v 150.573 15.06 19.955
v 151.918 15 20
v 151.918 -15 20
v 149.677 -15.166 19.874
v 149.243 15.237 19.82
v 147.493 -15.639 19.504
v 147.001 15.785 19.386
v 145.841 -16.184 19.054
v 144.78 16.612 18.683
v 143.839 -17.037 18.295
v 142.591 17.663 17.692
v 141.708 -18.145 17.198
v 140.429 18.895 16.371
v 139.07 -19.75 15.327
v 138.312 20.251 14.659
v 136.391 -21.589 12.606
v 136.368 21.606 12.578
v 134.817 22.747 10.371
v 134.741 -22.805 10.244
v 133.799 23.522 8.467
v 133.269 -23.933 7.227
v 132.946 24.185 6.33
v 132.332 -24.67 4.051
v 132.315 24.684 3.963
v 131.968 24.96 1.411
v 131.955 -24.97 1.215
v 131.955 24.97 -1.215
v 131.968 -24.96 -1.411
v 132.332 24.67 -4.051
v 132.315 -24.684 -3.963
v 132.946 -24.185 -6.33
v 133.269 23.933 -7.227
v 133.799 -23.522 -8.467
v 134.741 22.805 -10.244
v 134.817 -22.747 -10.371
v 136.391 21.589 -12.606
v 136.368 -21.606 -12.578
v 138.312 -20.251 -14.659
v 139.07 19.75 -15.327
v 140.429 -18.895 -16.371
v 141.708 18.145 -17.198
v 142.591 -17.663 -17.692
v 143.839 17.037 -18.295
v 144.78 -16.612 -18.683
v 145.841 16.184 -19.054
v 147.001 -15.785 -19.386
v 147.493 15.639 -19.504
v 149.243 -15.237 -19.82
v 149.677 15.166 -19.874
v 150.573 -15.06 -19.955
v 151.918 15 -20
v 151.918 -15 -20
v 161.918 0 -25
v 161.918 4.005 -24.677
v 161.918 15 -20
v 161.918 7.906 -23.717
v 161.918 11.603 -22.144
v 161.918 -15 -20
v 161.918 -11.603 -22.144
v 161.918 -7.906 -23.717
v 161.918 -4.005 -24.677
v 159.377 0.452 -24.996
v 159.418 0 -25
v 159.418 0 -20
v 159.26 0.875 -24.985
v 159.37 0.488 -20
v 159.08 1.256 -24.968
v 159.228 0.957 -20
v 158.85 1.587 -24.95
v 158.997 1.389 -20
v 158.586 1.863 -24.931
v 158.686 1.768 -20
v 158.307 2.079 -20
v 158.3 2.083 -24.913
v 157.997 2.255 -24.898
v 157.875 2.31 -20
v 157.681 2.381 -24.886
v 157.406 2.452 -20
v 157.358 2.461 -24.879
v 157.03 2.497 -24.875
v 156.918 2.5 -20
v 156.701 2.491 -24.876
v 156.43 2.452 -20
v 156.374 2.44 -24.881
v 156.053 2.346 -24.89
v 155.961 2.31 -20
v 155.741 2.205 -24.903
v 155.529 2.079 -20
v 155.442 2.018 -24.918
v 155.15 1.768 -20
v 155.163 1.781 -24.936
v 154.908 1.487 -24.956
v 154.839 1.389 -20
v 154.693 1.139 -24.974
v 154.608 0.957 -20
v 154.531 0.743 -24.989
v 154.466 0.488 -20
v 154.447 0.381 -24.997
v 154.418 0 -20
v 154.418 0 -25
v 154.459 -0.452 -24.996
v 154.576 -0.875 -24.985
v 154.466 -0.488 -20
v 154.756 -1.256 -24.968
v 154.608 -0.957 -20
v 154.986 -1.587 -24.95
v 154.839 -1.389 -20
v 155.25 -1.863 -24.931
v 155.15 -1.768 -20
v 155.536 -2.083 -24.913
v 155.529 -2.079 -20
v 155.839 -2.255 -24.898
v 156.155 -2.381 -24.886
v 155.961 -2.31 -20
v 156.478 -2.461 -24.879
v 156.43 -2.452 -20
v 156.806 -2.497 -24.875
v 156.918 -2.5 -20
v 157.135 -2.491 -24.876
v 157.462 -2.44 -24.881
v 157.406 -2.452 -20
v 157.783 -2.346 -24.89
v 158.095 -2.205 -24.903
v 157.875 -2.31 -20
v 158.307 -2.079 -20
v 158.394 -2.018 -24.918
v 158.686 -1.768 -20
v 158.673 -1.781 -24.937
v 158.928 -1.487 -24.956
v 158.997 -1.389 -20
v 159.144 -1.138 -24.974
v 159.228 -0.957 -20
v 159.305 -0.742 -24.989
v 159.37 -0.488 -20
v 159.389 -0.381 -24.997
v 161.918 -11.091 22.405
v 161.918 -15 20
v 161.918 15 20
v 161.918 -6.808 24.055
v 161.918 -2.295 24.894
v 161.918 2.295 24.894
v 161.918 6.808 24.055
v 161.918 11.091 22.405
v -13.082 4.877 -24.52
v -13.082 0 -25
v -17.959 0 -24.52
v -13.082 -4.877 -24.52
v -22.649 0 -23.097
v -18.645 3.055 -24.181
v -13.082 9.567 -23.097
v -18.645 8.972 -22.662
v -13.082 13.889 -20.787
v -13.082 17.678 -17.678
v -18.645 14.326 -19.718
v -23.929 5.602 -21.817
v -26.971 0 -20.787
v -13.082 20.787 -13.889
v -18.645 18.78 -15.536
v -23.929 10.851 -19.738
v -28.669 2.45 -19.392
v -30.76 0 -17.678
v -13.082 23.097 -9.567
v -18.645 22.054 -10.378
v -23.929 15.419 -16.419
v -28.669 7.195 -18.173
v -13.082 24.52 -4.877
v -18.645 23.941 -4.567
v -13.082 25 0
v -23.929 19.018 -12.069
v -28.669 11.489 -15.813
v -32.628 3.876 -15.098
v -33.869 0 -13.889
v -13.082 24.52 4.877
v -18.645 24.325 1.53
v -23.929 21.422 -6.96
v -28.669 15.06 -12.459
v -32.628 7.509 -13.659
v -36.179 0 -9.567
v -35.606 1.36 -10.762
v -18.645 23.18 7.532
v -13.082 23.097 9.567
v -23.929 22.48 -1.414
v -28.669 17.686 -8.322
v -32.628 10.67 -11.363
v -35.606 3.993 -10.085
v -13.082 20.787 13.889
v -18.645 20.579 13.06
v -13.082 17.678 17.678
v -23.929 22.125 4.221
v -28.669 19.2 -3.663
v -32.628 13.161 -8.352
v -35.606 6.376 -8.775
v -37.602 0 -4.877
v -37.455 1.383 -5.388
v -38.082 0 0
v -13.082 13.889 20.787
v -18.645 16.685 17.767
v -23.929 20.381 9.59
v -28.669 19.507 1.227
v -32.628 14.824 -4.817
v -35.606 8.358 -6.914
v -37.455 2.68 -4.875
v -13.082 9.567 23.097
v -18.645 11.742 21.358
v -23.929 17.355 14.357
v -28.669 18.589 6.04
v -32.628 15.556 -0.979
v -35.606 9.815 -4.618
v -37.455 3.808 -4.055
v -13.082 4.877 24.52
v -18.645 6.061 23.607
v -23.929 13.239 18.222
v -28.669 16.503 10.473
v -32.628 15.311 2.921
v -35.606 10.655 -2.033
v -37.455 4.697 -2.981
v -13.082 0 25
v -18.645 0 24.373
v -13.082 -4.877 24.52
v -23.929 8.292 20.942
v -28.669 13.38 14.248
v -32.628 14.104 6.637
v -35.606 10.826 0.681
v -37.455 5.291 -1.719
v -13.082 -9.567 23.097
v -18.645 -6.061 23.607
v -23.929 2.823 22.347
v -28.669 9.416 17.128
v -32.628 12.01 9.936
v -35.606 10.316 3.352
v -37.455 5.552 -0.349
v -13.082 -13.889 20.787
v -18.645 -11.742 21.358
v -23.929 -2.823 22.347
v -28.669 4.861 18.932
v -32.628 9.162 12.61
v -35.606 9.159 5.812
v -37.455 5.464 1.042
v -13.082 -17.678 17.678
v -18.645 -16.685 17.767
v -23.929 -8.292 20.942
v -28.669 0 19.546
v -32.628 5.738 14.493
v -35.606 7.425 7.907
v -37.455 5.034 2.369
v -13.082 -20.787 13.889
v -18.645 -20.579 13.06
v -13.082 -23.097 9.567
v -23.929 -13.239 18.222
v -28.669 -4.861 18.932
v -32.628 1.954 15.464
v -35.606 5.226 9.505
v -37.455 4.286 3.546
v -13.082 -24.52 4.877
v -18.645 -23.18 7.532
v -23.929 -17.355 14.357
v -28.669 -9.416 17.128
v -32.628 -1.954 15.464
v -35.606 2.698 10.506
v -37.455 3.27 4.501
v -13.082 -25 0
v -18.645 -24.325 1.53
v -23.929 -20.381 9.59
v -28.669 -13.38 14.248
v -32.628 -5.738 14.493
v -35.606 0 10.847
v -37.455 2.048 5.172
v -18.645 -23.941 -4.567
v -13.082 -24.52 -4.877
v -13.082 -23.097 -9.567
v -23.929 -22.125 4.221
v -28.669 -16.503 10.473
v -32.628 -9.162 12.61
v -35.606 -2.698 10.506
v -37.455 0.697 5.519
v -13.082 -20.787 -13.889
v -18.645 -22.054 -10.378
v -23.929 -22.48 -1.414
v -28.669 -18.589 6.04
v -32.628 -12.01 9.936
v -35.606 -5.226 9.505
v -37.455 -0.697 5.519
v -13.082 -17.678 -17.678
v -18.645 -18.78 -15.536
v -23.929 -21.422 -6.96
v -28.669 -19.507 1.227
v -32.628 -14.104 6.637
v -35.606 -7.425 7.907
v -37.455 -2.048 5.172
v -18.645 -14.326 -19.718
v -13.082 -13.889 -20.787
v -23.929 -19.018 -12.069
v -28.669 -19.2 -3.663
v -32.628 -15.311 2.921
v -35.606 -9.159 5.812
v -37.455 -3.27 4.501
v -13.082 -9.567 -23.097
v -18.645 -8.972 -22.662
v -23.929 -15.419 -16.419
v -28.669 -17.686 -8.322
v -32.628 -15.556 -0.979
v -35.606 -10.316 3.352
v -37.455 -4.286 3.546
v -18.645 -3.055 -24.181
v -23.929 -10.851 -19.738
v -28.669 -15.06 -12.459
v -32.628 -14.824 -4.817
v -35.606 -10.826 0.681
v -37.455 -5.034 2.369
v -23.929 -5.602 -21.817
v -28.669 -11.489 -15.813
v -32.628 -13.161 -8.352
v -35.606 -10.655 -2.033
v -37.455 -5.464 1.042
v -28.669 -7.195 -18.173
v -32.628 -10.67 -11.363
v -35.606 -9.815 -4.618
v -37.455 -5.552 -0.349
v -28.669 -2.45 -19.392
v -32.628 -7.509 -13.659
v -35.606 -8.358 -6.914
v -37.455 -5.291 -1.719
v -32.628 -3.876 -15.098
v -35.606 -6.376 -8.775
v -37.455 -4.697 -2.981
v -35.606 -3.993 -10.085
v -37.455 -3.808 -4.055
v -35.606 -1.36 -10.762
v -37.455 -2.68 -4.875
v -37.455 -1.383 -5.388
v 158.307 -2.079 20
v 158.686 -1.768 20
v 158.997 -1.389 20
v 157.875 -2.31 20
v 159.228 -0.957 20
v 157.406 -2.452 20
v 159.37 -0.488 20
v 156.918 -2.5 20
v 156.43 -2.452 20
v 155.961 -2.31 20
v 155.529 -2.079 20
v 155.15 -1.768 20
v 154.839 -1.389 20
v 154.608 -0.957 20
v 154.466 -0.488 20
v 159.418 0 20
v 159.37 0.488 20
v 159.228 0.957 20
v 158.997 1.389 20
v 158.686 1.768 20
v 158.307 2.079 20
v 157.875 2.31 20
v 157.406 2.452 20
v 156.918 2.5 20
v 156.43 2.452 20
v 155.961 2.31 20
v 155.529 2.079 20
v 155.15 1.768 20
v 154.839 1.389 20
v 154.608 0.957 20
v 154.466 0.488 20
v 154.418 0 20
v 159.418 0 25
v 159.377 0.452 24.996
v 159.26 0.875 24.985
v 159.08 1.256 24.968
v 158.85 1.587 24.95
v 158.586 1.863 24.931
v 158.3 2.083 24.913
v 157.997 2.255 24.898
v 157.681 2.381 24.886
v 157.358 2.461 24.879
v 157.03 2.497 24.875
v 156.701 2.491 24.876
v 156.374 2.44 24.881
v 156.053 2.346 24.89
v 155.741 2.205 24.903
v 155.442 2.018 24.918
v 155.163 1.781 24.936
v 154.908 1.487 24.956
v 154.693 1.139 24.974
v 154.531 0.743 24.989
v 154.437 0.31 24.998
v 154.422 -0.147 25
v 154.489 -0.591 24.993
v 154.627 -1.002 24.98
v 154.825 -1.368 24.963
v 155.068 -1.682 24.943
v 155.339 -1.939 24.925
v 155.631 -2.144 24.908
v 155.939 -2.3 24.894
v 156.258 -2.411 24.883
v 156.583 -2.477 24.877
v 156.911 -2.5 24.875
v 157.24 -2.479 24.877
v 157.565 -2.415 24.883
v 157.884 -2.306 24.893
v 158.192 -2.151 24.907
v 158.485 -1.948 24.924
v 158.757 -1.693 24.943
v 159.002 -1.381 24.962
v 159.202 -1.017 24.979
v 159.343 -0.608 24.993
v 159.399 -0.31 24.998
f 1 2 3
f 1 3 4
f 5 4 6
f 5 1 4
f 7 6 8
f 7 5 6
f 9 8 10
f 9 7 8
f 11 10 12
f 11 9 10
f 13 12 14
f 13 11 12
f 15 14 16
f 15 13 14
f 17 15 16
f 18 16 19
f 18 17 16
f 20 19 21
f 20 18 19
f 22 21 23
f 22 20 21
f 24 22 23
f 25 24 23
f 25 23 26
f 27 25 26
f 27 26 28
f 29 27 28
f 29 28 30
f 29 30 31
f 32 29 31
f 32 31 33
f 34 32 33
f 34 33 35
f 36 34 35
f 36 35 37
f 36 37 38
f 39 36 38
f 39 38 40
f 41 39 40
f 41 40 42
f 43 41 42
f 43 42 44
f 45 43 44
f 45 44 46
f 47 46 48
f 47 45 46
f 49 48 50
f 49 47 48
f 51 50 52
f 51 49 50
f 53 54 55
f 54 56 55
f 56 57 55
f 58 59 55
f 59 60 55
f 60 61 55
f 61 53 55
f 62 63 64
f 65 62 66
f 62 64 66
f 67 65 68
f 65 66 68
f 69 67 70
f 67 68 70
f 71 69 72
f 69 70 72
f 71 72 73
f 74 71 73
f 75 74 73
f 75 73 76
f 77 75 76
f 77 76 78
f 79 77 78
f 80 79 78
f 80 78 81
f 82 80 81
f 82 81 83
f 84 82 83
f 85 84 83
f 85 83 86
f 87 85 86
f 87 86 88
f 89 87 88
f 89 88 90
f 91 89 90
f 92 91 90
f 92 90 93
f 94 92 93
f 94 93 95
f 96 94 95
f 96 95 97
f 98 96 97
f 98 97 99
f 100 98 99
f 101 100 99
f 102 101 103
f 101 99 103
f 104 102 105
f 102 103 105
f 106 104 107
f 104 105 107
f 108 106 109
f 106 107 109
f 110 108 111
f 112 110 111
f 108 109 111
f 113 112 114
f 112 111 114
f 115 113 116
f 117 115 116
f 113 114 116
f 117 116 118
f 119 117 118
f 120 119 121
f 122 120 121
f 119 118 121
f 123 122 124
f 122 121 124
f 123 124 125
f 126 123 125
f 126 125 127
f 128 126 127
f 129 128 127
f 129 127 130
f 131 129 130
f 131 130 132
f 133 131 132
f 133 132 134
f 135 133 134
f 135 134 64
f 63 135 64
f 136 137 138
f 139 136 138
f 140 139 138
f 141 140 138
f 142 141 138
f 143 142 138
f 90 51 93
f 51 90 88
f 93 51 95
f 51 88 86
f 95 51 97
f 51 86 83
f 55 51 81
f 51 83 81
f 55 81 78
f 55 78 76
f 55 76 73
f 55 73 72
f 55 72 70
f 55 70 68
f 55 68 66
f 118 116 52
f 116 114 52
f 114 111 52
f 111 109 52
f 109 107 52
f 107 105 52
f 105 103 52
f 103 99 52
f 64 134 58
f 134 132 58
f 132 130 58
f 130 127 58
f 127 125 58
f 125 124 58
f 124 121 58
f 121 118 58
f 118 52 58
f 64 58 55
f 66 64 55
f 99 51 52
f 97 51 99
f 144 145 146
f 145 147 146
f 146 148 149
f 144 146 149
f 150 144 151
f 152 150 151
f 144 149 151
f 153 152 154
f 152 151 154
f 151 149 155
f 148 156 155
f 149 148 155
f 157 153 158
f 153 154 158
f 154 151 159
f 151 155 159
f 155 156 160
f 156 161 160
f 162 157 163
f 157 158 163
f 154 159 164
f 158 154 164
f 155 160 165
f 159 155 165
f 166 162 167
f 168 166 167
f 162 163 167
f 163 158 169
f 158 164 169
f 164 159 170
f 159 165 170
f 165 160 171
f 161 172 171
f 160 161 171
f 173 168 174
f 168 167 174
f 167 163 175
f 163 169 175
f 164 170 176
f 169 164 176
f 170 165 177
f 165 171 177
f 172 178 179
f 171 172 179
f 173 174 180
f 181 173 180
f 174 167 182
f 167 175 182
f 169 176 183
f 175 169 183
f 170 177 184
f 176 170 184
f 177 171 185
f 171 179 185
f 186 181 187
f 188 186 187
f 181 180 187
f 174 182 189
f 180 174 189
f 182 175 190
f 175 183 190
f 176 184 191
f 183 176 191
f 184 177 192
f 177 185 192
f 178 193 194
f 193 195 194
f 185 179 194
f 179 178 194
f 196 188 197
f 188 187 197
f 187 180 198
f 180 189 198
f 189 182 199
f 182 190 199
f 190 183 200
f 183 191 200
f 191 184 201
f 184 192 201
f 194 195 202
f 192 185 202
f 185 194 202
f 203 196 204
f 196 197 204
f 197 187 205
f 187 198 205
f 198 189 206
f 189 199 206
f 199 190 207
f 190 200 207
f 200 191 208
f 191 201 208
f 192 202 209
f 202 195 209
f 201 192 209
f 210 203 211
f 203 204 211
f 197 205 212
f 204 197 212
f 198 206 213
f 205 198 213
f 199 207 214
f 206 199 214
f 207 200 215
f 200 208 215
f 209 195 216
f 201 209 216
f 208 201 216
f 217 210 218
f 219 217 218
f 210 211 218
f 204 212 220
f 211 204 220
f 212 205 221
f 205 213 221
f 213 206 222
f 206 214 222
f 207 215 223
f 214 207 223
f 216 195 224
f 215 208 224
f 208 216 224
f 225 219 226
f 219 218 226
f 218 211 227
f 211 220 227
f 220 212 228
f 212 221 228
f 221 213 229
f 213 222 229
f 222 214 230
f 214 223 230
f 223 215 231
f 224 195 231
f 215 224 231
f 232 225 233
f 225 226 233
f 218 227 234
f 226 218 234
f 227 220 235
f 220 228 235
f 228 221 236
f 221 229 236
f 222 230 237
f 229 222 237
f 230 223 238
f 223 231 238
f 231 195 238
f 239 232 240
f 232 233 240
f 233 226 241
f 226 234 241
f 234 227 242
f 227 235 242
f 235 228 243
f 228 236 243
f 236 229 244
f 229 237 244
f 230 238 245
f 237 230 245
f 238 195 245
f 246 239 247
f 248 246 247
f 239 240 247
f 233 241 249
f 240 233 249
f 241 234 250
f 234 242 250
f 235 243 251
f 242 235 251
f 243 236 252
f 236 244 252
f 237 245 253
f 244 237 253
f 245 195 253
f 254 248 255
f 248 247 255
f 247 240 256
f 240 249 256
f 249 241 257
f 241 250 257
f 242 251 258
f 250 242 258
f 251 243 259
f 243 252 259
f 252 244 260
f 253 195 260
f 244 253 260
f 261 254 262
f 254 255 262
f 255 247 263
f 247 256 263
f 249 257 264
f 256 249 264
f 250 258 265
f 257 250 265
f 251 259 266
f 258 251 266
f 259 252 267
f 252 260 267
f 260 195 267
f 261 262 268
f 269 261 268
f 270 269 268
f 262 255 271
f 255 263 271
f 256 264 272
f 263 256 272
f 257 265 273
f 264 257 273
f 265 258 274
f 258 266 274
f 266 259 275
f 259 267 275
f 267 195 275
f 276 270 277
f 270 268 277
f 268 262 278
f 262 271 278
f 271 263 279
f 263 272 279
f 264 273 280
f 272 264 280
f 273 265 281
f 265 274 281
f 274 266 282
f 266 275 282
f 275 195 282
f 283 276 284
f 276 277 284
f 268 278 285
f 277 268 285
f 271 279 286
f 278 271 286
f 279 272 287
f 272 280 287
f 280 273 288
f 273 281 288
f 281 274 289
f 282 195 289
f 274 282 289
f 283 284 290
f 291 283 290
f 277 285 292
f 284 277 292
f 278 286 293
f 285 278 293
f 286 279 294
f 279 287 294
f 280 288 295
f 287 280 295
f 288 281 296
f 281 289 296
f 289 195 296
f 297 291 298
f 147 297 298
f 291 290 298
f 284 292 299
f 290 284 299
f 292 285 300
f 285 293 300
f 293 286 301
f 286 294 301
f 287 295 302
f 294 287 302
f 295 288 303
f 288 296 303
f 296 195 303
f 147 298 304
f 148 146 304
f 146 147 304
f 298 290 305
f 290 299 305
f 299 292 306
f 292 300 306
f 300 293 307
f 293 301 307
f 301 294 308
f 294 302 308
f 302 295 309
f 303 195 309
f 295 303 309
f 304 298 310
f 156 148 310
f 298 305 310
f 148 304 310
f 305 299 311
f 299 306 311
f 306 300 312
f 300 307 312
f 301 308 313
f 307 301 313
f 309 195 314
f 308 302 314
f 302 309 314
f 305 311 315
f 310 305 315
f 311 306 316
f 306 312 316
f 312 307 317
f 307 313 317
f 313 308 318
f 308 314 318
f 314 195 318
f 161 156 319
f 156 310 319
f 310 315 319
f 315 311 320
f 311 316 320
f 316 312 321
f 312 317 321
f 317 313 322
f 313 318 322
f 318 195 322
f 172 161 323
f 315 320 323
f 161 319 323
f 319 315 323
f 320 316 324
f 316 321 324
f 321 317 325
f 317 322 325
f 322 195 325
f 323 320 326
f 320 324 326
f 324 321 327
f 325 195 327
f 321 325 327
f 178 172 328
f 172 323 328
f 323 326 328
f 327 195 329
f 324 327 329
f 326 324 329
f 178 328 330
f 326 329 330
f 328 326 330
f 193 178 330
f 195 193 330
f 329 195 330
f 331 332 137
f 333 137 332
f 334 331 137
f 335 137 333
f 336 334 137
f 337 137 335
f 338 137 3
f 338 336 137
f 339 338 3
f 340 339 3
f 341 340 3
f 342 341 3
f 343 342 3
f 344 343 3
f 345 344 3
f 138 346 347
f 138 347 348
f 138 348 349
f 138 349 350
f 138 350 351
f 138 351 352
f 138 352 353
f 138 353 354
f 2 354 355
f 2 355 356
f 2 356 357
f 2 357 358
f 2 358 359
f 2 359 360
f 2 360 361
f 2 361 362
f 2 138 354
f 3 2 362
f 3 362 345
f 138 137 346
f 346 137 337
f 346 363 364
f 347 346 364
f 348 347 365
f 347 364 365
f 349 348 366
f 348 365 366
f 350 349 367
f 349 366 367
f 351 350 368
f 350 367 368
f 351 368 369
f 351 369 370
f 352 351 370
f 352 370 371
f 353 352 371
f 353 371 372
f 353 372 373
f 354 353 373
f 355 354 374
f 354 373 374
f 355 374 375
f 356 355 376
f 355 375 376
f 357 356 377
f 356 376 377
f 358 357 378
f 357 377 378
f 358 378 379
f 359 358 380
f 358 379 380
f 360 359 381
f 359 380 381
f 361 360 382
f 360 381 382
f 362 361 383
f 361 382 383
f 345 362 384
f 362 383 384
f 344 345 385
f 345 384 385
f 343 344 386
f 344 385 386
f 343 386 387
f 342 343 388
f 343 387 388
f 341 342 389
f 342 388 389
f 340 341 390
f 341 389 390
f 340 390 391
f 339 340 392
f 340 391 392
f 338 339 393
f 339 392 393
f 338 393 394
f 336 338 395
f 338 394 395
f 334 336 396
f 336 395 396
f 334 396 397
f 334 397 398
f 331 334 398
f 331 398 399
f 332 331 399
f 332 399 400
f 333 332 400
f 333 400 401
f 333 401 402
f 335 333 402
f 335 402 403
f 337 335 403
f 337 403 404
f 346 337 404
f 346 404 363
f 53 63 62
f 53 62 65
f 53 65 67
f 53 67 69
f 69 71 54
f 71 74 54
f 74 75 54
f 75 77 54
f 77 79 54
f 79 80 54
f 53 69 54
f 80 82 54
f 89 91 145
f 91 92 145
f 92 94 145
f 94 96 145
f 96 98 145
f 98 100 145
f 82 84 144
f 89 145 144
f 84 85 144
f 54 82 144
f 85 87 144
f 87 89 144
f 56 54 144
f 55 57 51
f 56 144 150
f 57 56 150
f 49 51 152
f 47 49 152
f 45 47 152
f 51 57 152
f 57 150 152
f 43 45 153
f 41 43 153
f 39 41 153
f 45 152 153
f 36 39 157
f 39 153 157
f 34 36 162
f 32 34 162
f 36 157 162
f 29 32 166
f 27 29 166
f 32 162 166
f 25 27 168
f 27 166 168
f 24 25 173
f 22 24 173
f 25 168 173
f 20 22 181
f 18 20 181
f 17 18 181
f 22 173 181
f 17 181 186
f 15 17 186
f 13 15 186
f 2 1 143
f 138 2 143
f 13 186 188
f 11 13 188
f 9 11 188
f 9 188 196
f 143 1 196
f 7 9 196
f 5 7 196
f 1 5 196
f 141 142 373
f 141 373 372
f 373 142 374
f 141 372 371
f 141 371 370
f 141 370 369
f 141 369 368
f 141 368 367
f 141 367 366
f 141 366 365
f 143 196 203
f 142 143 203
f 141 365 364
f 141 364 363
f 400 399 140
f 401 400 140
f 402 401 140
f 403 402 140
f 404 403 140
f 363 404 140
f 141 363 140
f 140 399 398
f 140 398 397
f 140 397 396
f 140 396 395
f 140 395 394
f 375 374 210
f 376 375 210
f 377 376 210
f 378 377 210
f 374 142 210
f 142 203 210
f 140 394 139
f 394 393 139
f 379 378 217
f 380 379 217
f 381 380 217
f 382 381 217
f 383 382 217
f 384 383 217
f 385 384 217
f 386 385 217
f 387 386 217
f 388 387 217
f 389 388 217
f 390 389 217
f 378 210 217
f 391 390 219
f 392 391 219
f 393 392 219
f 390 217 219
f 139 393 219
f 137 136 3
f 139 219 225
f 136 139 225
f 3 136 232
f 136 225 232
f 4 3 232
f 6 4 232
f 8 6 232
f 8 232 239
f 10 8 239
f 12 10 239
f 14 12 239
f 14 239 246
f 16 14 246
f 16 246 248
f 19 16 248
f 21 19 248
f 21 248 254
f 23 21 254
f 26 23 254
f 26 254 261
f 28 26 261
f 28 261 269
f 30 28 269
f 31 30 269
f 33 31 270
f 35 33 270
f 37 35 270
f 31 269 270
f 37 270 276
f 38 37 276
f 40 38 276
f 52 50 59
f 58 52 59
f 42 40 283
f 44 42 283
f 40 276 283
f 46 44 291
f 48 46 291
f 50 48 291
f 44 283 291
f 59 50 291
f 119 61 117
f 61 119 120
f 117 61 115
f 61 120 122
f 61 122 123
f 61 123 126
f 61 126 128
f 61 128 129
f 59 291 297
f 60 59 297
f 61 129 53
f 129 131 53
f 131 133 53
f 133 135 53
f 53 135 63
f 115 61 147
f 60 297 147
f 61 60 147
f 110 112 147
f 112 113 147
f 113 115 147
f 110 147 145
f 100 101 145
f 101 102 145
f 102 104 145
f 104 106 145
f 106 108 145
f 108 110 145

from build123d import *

# Parameters (mm, degrees)
CROQUIS6_R                 = 2.5
CORTAR_EXTRUIR1_DEPTH      = 26
CORTAR_EXTRUIR1_DEPTH_BACK = 26
CORTAR_EXTRUIR3_DEPTH      = 26.0000001
CORTAR_EXTRUIR3_DEPTH_BACK = 26.0000001


with BuildPart() as part:
    # Croquis3 → Revolución10 (revolve)
    with BuildSketch(Plane(origin=(0, 0, 0), x_dir=(1, 0, 0), z_dir=(0, 1, 0))):
        with BuildLine():
            Line((-38.081992127, 0), (161.918007873, 0))
            Line((161.918007873, 0), (161.918007873, 25))
            Line((161.918007873, 25), (-13.081992127, 25))
            ThreePointArc((-13.081992127, 25), (-30.759661656, 17.67766953), (-38.081992127, 0))
        make_face()
    revolve(axis=Axis((-38.081992127, 0, 0), (1, 0, 0)))

    # Croquis6 → Cortar-Extruir1 (cut, two sides)
    with BuildSketch(Plane.XY) as cortar_extruir1_sk:
        with Locations((156.918007873, 0)):
            Circle(CROQUIS6_R)
    extrude(amount=CORTAR_EXTRUIR1_DEPTH, mode=Mode.SUBTRACT)
    extrude(cortar_extruir1_sk.sketch, amount=-CORTAR_EXTRUIR1_DEPTH_BACK, mode=Mode.SUBTRACT)

    # Croquis9 → Cortar-Extruir3 (cut, two sides)
    with BuildSketch(Plane(origin=(0, 0, 0), x_dir=(1, 0, 0), z_dir=(0, 1, 0))) as cortar_extruir3_sk:
        with BuildLine():
            Line((161.918007873, 20), (161.918007873, -20))
            Line((161.918007873, -20), (151.918007873, -20))
            ThreePointArc((151.918007873, -20), (131.918007873, 0), (151.918007873, 20))
            Line((151.918007873, 20), (161.918007873, 20))
        make_face()
    extrude(amount=CORTAR_EXTRUIR3_DEPTH, mode=Mode.SUBTRACT)
    extrude(cortar_extruir3_sk.sketch, amount=-CORTAR_EXTRUIR3_DEPTH_BACK, mode=Mode.SUBTRACT)


solid = part.part
